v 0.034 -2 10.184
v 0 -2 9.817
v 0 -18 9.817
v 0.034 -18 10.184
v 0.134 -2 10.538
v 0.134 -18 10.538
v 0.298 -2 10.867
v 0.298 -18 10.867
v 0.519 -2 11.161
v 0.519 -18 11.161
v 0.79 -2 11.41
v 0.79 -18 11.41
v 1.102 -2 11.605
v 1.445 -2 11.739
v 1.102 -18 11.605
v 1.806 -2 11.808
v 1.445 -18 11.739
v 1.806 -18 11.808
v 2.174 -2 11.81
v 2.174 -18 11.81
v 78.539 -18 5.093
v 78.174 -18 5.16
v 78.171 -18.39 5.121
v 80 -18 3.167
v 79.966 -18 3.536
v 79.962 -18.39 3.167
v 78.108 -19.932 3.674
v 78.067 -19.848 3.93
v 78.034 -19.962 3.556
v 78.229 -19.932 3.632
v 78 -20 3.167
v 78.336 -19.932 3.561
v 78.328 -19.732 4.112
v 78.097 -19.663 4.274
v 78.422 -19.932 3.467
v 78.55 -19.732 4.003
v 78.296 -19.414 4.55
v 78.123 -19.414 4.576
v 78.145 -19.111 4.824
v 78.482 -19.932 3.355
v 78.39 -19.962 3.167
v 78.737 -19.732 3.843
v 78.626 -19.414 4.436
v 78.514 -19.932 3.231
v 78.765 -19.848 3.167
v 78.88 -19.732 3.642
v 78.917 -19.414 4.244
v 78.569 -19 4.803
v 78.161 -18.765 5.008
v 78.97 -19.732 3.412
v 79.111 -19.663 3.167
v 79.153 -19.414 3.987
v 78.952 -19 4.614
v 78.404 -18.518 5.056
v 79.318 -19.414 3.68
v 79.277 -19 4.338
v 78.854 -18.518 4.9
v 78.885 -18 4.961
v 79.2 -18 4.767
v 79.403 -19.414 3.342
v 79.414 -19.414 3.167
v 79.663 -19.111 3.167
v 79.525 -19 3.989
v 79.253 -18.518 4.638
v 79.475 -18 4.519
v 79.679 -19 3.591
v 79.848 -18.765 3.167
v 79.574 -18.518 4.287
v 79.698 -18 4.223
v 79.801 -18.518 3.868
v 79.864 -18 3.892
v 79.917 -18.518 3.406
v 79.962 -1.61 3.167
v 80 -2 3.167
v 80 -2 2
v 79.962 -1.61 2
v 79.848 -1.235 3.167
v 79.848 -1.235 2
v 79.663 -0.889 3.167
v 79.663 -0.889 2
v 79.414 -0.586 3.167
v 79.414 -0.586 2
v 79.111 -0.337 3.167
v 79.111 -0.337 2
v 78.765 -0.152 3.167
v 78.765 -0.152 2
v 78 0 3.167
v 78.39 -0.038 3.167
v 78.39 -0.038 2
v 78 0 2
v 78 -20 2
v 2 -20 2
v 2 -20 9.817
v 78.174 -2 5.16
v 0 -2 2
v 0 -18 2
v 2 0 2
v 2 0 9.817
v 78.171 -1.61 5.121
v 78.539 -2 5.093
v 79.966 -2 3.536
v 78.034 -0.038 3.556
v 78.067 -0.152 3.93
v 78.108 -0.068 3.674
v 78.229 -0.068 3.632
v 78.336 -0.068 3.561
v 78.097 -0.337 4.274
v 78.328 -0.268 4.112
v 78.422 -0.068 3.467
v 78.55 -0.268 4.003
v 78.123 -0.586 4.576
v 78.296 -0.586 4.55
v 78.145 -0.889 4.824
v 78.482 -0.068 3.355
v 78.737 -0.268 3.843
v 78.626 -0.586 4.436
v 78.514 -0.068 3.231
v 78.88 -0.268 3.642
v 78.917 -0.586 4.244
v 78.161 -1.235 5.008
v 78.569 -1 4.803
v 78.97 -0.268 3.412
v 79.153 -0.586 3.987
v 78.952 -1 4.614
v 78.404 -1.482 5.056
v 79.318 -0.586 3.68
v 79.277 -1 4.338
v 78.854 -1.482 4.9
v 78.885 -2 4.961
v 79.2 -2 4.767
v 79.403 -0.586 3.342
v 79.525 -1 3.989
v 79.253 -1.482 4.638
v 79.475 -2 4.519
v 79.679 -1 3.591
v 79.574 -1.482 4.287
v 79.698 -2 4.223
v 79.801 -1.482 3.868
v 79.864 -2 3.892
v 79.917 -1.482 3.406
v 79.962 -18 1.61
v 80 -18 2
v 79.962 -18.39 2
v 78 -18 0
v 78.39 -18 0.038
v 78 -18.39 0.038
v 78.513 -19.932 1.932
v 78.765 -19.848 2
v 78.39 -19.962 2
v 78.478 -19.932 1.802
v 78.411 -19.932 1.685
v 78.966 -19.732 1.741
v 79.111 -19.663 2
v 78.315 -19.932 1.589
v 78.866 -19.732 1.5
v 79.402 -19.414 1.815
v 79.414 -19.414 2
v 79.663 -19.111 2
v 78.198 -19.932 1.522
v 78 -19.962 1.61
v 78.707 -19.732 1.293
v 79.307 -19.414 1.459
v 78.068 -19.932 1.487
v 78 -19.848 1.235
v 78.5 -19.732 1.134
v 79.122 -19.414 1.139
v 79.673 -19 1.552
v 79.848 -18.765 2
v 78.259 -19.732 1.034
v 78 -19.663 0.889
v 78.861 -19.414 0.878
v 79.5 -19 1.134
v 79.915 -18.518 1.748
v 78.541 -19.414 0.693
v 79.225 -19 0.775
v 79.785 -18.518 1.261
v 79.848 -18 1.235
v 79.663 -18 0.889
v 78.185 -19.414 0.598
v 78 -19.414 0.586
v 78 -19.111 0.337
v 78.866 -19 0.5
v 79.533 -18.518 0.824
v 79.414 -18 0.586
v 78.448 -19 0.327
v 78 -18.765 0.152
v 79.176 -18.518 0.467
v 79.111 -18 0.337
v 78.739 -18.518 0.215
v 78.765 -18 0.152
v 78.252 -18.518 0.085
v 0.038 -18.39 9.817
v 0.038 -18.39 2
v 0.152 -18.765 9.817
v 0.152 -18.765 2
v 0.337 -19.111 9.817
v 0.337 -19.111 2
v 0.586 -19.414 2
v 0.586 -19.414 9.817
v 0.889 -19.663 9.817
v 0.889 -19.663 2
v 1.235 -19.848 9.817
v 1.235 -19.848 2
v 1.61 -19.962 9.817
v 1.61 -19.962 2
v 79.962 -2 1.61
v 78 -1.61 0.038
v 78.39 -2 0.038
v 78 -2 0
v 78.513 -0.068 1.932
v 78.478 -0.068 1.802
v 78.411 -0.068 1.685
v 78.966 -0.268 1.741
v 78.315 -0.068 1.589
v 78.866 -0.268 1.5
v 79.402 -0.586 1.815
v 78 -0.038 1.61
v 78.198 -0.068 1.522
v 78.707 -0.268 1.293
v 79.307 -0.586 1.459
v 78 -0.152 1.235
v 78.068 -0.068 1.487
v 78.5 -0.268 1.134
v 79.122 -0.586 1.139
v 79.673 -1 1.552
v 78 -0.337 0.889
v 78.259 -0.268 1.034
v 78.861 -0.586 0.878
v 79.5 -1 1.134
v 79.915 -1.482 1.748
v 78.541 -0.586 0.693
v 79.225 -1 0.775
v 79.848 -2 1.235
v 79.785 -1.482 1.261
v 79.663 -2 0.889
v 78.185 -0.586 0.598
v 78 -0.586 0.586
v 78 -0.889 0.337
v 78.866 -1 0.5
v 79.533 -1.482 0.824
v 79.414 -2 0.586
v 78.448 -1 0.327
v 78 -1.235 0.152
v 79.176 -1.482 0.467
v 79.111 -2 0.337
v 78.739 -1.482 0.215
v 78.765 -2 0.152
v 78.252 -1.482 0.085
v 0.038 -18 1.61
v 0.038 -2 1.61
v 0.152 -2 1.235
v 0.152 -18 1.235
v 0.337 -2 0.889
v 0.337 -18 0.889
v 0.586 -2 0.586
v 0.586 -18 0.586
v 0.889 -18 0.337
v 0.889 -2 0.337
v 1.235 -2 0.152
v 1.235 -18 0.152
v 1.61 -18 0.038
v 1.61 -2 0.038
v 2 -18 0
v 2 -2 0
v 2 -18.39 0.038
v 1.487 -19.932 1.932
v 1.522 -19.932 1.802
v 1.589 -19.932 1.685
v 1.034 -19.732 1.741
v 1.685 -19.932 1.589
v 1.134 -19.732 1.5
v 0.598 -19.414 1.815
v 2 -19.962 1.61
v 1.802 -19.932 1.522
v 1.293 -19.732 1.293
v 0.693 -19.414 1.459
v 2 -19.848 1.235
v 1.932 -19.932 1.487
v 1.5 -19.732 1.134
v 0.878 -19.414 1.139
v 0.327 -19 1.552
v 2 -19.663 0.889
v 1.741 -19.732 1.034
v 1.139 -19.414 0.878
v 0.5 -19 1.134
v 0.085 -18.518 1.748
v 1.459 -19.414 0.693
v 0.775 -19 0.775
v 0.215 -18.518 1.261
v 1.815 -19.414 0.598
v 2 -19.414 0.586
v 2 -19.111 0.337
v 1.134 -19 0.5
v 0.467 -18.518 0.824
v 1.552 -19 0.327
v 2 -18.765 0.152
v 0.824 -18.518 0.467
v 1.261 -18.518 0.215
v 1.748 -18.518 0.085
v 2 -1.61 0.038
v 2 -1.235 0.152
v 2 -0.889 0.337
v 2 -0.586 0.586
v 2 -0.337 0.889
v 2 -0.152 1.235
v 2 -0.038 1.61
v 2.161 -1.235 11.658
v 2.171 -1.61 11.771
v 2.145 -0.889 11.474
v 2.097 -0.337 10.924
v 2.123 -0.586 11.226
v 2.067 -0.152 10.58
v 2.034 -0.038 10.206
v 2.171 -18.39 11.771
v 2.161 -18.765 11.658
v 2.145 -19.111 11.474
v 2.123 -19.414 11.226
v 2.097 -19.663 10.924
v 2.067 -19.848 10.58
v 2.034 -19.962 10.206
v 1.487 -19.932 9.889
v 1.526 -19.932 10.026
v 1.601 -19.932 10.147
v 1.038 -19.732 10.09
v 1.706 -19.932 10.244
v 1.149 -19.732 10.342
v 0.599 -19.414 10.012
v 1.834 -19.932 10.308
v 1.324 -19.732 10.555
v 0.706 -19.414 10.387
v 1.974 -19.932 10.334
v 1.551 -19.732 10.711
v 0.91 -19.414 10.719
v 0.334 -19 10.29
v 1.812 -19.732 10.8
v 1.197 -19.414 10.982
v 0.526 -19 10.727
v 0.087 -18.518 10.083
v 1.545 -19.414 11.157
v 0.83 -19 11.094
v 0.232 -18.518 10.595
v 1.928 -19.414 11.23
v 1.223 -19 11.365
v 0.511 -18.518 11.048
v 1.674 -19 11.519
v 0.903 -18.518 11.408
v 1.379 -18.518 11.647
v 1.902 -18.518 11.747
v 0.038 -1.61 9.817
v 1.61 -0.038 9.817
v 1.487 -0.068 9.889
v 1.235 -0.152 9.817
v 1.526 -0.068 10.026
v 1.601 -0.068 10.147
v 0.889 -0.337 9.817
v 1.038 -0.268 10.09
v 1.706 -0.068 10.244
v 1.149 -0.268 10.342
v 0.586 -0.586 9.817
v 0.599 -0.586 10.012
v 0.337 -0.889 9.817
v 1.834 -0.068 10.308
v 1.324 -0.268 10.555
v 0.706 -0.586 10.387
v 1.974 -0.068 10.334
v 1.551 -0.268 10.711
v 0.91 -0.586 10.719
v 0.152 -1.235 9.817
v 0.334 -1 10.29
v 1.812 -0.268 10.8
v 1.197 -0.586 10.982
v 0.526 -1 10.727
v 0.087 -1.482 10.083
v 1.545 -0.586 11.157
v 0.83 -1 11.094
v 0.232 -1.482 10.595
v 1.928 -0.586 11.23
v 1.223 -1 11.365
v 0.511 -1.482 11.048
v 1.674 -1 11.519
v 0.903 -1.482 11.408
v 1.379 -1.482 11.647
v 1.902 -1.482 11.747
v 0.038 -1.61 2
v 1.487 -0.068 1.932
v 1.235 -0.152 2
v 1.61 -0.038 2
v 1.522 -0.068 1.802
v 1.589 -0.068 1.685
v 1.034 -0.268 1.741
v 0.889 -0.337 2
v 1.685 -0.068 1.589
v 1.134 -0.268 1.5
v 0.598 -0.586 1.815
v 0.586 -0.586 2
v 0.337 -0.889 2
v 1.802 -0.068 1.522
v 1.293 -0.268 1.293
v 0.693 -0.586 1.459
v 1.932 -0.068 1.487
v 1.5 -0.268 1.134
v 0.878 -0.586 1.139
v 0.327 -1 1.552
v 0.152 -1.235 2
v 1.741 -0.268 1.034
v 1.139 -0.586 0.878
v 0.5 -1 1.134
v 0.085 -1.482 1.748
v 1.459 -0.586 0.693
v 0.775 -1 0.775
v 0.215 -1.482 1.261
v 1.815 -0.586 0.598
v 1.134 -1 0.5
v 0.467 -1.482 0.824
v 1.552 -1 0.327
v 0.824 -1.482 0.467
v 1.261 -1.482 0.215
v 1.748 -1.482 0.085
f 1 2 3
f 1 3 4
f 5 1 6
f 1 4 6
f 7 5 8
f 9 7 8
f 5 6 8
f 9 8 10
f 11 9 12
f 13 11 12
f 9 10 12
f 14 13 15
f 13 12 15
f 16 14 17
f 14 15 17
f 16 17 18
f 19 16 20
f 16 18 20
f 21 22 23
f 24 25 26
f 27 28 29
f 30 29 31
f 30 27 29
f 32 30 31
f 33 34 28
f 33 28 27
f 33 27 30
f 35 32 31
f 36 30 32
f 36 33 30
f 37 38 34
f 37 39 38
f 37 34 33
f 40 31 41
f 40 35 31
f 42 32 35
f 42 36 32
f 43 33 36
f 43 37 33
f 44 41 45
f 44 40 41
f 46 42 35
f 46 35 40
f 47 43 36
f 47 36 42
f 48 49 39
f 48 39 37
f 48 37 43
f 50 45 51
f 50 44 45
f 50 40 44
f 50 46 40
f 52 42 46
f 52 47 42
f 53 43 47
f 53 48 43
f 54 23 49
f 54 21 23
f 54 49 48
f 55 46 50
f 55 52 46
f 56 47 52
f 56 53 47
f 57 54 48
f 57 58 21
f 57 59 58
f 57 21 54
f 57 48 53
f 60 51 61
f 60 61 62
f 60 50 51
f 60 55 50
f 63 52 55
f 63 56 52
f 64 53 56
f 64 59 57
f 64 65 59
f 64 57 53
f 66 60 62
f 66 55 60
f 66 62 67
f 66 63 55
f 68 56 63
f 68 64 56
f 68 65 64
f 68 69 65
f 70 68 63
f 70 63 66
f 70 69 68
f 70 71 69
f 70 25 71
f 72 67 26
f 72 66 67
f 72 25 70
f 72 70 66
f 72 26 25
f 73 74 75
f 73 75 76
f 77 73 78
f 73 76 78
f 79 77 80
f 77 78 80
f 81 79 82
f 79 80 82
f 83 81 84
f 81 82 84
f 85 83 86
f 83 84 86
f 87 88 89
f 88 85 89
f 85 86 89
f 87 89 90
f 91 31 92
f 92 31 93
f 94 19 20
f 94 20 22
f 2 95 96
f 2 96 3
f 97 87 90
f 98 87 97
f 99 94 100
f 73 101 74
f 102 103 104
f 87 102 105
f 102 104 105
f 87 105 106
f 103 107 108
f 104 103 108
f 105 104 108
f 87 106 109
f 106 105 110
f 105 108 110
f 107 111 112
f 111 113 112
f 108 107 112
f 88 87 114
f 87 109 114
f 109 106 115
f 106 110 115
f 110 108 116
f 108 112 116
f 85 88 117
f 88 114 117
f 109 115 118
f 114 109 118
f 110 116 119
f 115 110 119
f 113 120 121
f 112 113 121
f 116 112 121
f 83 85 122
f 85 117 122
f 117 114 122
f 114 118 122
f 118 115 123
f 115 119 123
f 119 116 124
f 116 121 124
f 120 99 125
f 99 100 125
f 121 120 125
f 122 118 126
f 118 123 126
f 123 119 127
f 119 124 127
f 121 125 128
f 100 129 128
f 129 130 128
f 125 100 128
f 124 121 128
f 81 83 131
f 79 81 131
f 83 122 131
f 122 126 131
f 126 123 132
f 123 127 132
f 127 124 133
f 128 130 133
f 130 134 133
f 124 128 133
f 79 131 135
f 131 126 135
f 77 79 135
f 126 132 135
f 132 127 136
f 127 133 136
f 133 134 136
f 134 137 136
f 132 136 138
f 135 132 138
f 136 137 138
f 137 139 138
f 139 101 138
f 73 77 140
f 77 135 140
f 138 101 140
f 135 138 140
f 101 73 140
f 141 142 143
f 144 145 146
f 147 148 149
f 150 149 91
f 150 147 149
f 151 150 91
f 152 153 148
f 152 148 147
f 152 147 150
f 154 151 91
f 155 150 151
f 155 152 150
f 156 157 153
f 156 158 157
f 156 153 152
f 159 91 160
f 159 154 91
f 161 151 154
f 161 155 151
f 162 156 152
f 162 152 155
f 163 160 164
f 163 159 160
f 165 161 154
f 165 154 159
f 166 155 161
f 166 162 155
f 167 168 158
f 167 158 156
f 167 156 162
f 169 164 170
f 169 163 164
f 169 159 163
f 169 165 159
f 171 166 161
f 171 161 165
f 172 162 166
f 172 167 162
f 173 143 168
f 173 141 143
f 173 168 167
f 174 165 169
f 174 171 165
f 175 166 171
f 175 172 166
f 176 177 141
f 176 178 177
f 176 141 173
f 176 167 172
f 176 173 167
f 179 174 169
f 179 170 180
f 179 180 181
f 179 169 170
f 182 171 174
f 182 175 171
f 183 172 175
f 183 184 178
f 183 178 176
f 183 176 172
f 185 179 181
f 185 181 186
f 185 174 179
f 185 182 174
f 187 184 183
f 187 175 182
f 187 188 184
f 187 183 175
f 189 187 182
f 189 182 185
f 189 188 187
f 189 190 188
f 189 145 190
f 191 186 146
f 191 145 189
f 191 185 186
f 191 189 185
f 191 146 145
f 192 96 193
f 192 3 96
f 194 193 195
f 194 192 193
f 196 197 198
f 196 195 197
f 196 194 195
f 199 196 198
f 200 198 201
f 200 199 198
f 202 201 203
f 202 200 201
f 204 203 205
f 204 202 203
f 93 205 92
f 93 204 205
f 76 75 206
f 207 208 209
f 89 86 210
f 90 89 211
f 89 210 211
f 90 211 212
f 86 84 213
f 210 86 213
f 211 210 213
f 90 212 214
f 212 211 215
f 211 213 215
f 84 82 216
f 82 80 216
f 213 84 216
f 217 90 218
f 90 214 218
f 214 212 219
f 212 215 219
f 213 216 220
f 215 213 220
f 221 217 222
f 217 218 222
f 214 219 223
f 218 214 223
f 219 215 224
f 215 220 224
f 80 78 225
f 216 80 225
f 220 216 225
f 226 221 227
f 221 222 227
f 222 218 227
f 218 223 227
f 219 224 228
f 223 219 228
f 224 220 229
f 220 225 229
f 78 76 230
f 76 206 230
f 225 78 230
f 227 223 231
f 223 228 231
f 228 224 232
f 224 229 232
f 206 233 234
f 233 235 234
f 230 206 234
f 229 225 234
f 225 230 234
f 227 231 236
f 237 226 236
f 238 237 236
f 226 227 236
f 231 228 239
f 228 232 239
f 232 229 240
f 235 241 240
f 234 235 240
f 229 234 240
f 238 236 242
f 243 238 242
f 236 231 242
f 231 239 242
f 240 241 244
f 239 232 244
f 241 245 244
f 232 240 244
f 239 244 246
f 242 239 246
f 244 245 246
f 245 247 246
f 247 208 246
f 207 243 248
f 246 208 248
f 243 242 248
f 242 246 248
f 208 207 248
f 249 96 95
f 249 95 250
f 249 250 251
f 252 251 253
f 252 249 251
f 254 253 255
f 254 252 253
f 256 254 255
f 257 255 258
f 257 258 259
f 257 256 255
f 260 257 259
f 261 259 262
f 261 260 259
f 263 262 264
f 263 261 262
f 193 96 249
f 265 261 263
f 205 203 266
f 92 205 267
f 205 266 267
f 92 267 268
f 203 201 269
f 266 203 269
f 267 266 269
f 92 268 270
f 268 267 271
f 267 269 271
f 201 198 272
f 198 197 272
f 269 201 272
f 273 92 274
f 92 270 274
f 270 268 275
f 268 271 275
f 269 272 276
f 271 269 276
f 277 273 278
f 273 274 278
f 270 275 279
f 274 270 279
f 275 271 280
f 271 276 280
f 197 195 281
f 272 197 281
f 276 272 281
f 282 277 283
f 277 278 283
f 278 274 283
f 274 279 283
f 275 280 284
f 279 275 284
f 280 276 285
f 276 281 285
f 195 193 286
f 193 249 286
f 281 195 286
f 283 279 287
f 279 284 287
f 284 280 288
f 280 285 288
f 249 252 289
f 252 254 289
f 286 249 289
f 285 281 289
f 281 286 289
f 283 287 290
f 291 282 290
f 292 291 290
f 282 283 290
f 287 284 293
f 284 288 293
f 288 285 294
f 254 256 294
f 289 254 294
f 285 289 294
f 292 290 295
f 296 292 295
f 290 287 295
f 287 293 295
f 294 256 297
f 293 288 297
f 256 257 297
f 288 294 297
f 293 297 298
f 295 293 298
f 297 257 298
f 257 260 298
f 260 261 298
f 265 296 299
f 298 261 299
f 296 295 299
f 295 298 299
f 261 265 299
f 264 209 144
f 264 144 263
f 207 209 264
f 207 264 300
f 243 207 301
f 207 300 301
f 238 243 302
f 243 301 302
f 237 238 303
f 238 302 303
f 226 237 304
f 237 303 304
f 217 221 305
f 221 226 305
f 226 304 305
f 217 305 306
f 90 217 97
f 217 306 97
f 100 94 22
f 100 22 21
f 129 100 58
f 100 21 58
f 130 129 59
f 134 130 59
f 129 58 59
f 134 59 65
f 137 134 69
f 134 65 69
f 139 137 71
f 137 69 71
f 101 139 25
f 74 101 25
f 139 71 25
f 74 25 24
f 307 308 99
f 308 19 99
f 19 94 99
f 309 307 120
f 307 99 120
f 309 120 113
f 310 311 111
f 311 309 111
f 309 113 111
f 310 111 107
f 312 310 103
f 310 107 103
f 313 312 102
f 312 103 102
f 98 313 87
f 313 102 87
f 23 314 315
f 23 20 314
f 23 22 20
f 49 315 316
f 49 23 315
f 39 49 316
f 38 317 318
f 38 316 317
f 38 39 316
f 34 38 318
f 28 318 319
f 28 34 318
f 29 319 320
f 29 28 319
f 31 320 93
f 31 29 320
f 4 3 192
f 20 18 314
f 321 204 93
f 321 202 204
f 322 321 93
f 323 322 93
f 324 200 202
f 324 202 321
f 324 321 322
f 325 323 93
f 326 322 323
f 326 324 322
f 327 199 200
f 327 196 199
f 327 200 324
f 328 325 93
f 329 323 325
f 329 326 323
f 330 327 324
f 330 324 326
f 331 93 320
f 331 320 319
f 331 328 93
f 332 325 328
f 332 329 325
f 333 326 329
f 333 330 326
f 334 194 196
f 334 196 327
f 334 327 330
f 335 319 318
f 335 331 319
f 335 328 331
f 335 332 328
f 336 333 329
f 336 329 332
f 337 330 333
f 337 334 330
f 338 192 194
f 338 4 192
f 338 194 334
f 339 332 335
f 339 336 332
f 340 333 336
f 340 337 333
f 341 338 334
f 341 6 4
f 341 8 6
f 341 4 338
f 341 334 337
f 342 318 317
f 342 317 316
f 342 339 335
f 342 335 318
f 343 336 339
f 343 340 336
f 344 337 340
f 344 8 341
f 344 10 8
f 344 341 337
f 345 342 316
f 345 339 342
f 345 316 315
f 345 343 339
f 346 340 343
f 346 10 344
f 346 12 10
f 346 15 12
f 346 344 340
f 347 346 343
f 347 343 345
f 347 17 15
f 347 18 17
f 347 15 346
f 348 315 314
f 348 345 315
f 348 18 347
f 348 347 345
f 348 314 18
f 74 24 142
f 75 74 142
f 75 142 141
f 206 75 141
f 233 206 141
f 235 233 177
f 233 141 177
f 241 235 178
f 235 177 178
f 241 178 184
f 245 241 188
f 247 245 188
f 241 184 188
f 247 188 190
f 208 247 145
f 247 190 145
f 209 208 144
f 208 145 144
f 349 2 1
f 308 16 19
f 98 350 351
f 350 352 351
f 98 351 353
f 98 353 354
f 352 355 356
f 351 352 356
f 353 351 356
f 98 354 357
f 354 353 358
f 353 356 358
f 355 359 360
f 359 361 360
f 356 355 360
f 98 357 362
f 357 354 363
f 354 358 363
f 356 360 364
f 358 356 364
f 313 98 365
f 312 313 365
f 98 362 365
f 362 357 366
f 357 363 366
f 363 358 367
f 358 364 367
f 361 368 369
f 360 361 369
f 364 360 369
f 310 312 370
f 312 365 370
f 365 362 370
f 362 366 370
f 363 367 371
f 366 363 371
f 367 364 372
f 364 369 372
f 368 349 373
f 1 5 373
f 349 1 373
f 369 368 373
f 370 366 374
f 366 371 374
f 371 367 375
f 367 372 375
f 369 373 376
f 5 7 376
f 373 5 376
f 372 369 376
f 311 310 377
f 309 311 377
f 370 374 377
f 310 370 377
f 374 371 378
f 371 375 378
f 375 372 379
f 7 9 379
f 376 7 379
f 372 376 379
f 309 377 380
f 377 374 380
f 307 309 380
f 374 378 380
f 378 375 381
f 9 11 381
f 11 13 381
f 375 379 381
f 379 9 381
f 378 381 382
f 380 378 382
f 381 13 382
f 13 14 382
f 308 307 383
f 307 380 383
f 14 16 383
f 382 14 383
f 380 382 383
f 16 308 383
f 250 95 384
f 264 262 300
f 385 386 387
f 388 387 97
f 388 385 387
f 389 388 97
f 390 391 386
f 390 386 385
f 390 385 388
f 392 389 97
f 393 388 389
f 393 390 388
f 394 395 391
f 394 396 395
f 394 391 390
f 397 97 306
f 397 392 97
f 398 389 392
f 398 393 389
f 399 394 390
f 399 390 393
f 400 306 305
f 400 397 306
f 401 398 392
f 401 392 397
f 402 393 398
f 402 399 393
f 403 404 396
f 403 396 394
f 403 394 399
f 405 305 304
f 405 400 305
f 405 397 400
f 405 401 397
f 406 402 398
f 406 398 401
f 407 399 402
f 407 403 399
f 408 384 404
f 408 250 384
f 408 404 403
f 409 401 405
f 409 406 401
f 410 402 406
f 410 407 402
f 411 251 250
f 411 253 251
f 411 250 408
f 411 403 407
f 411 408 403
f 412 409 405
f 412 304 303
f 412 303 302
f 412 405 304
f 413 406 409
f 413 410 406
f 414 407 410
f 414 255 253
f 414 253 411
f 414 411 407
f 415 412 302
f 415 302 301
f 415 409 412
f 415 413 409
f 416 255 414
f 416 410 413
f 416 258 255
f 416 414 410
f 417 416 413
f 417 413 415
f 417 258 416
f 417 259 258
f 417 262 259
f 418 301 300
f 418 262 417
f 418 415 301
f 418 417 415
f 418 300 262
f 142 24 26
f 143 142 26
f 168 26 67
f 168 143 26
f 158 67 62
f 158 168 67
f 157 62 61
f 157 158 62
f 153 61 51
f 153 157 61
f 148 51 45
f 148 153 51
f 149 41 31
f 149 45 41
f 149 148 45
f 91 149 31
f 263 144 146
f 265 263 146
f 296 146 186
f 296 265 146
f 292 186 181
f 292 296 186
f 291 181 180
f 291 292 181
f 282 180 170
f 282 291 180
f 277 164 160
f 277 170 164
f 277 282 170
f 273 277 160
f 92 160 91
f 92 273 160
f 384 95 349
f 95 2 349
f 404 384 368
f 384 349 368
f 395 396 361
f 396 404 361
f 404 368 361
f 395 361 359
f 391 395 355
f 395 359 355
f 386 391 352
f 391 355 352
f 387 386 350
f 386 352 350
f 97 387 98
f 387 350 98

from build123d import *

# Parameters (mm, degrees)
PAD_DEPTH = 20
FILLET_R  = 2


with BuildPart() as part:
    # Sketch → Pad (new body)
    with BuildSketch(Plane.XZ):
        Polygon((0, 0), (0, 12), (80, 5), (80, 0), align=None)
    extrude(amount=PAD_DEPTH)

    # Fillet
    fillet_edges = [part.edges().sort_by_distance(p)[0] for p in [
        (0, -10, 0),
        (0, -10, 12),
        (0, 0, 6),
        (0, -20, 6),
        (80, -10, 5),
        (40, 0, 8.5),
        (40, -20, 8.5),
        (80, -10, 0),
        (80, 0, 2.5),
        (80, -20, 2.5),
        (40, 0, 0),
        (40, -20, 0),
    ]]
    fillet(fillet_edges, radius=FILLET_R)


solid = part.part
